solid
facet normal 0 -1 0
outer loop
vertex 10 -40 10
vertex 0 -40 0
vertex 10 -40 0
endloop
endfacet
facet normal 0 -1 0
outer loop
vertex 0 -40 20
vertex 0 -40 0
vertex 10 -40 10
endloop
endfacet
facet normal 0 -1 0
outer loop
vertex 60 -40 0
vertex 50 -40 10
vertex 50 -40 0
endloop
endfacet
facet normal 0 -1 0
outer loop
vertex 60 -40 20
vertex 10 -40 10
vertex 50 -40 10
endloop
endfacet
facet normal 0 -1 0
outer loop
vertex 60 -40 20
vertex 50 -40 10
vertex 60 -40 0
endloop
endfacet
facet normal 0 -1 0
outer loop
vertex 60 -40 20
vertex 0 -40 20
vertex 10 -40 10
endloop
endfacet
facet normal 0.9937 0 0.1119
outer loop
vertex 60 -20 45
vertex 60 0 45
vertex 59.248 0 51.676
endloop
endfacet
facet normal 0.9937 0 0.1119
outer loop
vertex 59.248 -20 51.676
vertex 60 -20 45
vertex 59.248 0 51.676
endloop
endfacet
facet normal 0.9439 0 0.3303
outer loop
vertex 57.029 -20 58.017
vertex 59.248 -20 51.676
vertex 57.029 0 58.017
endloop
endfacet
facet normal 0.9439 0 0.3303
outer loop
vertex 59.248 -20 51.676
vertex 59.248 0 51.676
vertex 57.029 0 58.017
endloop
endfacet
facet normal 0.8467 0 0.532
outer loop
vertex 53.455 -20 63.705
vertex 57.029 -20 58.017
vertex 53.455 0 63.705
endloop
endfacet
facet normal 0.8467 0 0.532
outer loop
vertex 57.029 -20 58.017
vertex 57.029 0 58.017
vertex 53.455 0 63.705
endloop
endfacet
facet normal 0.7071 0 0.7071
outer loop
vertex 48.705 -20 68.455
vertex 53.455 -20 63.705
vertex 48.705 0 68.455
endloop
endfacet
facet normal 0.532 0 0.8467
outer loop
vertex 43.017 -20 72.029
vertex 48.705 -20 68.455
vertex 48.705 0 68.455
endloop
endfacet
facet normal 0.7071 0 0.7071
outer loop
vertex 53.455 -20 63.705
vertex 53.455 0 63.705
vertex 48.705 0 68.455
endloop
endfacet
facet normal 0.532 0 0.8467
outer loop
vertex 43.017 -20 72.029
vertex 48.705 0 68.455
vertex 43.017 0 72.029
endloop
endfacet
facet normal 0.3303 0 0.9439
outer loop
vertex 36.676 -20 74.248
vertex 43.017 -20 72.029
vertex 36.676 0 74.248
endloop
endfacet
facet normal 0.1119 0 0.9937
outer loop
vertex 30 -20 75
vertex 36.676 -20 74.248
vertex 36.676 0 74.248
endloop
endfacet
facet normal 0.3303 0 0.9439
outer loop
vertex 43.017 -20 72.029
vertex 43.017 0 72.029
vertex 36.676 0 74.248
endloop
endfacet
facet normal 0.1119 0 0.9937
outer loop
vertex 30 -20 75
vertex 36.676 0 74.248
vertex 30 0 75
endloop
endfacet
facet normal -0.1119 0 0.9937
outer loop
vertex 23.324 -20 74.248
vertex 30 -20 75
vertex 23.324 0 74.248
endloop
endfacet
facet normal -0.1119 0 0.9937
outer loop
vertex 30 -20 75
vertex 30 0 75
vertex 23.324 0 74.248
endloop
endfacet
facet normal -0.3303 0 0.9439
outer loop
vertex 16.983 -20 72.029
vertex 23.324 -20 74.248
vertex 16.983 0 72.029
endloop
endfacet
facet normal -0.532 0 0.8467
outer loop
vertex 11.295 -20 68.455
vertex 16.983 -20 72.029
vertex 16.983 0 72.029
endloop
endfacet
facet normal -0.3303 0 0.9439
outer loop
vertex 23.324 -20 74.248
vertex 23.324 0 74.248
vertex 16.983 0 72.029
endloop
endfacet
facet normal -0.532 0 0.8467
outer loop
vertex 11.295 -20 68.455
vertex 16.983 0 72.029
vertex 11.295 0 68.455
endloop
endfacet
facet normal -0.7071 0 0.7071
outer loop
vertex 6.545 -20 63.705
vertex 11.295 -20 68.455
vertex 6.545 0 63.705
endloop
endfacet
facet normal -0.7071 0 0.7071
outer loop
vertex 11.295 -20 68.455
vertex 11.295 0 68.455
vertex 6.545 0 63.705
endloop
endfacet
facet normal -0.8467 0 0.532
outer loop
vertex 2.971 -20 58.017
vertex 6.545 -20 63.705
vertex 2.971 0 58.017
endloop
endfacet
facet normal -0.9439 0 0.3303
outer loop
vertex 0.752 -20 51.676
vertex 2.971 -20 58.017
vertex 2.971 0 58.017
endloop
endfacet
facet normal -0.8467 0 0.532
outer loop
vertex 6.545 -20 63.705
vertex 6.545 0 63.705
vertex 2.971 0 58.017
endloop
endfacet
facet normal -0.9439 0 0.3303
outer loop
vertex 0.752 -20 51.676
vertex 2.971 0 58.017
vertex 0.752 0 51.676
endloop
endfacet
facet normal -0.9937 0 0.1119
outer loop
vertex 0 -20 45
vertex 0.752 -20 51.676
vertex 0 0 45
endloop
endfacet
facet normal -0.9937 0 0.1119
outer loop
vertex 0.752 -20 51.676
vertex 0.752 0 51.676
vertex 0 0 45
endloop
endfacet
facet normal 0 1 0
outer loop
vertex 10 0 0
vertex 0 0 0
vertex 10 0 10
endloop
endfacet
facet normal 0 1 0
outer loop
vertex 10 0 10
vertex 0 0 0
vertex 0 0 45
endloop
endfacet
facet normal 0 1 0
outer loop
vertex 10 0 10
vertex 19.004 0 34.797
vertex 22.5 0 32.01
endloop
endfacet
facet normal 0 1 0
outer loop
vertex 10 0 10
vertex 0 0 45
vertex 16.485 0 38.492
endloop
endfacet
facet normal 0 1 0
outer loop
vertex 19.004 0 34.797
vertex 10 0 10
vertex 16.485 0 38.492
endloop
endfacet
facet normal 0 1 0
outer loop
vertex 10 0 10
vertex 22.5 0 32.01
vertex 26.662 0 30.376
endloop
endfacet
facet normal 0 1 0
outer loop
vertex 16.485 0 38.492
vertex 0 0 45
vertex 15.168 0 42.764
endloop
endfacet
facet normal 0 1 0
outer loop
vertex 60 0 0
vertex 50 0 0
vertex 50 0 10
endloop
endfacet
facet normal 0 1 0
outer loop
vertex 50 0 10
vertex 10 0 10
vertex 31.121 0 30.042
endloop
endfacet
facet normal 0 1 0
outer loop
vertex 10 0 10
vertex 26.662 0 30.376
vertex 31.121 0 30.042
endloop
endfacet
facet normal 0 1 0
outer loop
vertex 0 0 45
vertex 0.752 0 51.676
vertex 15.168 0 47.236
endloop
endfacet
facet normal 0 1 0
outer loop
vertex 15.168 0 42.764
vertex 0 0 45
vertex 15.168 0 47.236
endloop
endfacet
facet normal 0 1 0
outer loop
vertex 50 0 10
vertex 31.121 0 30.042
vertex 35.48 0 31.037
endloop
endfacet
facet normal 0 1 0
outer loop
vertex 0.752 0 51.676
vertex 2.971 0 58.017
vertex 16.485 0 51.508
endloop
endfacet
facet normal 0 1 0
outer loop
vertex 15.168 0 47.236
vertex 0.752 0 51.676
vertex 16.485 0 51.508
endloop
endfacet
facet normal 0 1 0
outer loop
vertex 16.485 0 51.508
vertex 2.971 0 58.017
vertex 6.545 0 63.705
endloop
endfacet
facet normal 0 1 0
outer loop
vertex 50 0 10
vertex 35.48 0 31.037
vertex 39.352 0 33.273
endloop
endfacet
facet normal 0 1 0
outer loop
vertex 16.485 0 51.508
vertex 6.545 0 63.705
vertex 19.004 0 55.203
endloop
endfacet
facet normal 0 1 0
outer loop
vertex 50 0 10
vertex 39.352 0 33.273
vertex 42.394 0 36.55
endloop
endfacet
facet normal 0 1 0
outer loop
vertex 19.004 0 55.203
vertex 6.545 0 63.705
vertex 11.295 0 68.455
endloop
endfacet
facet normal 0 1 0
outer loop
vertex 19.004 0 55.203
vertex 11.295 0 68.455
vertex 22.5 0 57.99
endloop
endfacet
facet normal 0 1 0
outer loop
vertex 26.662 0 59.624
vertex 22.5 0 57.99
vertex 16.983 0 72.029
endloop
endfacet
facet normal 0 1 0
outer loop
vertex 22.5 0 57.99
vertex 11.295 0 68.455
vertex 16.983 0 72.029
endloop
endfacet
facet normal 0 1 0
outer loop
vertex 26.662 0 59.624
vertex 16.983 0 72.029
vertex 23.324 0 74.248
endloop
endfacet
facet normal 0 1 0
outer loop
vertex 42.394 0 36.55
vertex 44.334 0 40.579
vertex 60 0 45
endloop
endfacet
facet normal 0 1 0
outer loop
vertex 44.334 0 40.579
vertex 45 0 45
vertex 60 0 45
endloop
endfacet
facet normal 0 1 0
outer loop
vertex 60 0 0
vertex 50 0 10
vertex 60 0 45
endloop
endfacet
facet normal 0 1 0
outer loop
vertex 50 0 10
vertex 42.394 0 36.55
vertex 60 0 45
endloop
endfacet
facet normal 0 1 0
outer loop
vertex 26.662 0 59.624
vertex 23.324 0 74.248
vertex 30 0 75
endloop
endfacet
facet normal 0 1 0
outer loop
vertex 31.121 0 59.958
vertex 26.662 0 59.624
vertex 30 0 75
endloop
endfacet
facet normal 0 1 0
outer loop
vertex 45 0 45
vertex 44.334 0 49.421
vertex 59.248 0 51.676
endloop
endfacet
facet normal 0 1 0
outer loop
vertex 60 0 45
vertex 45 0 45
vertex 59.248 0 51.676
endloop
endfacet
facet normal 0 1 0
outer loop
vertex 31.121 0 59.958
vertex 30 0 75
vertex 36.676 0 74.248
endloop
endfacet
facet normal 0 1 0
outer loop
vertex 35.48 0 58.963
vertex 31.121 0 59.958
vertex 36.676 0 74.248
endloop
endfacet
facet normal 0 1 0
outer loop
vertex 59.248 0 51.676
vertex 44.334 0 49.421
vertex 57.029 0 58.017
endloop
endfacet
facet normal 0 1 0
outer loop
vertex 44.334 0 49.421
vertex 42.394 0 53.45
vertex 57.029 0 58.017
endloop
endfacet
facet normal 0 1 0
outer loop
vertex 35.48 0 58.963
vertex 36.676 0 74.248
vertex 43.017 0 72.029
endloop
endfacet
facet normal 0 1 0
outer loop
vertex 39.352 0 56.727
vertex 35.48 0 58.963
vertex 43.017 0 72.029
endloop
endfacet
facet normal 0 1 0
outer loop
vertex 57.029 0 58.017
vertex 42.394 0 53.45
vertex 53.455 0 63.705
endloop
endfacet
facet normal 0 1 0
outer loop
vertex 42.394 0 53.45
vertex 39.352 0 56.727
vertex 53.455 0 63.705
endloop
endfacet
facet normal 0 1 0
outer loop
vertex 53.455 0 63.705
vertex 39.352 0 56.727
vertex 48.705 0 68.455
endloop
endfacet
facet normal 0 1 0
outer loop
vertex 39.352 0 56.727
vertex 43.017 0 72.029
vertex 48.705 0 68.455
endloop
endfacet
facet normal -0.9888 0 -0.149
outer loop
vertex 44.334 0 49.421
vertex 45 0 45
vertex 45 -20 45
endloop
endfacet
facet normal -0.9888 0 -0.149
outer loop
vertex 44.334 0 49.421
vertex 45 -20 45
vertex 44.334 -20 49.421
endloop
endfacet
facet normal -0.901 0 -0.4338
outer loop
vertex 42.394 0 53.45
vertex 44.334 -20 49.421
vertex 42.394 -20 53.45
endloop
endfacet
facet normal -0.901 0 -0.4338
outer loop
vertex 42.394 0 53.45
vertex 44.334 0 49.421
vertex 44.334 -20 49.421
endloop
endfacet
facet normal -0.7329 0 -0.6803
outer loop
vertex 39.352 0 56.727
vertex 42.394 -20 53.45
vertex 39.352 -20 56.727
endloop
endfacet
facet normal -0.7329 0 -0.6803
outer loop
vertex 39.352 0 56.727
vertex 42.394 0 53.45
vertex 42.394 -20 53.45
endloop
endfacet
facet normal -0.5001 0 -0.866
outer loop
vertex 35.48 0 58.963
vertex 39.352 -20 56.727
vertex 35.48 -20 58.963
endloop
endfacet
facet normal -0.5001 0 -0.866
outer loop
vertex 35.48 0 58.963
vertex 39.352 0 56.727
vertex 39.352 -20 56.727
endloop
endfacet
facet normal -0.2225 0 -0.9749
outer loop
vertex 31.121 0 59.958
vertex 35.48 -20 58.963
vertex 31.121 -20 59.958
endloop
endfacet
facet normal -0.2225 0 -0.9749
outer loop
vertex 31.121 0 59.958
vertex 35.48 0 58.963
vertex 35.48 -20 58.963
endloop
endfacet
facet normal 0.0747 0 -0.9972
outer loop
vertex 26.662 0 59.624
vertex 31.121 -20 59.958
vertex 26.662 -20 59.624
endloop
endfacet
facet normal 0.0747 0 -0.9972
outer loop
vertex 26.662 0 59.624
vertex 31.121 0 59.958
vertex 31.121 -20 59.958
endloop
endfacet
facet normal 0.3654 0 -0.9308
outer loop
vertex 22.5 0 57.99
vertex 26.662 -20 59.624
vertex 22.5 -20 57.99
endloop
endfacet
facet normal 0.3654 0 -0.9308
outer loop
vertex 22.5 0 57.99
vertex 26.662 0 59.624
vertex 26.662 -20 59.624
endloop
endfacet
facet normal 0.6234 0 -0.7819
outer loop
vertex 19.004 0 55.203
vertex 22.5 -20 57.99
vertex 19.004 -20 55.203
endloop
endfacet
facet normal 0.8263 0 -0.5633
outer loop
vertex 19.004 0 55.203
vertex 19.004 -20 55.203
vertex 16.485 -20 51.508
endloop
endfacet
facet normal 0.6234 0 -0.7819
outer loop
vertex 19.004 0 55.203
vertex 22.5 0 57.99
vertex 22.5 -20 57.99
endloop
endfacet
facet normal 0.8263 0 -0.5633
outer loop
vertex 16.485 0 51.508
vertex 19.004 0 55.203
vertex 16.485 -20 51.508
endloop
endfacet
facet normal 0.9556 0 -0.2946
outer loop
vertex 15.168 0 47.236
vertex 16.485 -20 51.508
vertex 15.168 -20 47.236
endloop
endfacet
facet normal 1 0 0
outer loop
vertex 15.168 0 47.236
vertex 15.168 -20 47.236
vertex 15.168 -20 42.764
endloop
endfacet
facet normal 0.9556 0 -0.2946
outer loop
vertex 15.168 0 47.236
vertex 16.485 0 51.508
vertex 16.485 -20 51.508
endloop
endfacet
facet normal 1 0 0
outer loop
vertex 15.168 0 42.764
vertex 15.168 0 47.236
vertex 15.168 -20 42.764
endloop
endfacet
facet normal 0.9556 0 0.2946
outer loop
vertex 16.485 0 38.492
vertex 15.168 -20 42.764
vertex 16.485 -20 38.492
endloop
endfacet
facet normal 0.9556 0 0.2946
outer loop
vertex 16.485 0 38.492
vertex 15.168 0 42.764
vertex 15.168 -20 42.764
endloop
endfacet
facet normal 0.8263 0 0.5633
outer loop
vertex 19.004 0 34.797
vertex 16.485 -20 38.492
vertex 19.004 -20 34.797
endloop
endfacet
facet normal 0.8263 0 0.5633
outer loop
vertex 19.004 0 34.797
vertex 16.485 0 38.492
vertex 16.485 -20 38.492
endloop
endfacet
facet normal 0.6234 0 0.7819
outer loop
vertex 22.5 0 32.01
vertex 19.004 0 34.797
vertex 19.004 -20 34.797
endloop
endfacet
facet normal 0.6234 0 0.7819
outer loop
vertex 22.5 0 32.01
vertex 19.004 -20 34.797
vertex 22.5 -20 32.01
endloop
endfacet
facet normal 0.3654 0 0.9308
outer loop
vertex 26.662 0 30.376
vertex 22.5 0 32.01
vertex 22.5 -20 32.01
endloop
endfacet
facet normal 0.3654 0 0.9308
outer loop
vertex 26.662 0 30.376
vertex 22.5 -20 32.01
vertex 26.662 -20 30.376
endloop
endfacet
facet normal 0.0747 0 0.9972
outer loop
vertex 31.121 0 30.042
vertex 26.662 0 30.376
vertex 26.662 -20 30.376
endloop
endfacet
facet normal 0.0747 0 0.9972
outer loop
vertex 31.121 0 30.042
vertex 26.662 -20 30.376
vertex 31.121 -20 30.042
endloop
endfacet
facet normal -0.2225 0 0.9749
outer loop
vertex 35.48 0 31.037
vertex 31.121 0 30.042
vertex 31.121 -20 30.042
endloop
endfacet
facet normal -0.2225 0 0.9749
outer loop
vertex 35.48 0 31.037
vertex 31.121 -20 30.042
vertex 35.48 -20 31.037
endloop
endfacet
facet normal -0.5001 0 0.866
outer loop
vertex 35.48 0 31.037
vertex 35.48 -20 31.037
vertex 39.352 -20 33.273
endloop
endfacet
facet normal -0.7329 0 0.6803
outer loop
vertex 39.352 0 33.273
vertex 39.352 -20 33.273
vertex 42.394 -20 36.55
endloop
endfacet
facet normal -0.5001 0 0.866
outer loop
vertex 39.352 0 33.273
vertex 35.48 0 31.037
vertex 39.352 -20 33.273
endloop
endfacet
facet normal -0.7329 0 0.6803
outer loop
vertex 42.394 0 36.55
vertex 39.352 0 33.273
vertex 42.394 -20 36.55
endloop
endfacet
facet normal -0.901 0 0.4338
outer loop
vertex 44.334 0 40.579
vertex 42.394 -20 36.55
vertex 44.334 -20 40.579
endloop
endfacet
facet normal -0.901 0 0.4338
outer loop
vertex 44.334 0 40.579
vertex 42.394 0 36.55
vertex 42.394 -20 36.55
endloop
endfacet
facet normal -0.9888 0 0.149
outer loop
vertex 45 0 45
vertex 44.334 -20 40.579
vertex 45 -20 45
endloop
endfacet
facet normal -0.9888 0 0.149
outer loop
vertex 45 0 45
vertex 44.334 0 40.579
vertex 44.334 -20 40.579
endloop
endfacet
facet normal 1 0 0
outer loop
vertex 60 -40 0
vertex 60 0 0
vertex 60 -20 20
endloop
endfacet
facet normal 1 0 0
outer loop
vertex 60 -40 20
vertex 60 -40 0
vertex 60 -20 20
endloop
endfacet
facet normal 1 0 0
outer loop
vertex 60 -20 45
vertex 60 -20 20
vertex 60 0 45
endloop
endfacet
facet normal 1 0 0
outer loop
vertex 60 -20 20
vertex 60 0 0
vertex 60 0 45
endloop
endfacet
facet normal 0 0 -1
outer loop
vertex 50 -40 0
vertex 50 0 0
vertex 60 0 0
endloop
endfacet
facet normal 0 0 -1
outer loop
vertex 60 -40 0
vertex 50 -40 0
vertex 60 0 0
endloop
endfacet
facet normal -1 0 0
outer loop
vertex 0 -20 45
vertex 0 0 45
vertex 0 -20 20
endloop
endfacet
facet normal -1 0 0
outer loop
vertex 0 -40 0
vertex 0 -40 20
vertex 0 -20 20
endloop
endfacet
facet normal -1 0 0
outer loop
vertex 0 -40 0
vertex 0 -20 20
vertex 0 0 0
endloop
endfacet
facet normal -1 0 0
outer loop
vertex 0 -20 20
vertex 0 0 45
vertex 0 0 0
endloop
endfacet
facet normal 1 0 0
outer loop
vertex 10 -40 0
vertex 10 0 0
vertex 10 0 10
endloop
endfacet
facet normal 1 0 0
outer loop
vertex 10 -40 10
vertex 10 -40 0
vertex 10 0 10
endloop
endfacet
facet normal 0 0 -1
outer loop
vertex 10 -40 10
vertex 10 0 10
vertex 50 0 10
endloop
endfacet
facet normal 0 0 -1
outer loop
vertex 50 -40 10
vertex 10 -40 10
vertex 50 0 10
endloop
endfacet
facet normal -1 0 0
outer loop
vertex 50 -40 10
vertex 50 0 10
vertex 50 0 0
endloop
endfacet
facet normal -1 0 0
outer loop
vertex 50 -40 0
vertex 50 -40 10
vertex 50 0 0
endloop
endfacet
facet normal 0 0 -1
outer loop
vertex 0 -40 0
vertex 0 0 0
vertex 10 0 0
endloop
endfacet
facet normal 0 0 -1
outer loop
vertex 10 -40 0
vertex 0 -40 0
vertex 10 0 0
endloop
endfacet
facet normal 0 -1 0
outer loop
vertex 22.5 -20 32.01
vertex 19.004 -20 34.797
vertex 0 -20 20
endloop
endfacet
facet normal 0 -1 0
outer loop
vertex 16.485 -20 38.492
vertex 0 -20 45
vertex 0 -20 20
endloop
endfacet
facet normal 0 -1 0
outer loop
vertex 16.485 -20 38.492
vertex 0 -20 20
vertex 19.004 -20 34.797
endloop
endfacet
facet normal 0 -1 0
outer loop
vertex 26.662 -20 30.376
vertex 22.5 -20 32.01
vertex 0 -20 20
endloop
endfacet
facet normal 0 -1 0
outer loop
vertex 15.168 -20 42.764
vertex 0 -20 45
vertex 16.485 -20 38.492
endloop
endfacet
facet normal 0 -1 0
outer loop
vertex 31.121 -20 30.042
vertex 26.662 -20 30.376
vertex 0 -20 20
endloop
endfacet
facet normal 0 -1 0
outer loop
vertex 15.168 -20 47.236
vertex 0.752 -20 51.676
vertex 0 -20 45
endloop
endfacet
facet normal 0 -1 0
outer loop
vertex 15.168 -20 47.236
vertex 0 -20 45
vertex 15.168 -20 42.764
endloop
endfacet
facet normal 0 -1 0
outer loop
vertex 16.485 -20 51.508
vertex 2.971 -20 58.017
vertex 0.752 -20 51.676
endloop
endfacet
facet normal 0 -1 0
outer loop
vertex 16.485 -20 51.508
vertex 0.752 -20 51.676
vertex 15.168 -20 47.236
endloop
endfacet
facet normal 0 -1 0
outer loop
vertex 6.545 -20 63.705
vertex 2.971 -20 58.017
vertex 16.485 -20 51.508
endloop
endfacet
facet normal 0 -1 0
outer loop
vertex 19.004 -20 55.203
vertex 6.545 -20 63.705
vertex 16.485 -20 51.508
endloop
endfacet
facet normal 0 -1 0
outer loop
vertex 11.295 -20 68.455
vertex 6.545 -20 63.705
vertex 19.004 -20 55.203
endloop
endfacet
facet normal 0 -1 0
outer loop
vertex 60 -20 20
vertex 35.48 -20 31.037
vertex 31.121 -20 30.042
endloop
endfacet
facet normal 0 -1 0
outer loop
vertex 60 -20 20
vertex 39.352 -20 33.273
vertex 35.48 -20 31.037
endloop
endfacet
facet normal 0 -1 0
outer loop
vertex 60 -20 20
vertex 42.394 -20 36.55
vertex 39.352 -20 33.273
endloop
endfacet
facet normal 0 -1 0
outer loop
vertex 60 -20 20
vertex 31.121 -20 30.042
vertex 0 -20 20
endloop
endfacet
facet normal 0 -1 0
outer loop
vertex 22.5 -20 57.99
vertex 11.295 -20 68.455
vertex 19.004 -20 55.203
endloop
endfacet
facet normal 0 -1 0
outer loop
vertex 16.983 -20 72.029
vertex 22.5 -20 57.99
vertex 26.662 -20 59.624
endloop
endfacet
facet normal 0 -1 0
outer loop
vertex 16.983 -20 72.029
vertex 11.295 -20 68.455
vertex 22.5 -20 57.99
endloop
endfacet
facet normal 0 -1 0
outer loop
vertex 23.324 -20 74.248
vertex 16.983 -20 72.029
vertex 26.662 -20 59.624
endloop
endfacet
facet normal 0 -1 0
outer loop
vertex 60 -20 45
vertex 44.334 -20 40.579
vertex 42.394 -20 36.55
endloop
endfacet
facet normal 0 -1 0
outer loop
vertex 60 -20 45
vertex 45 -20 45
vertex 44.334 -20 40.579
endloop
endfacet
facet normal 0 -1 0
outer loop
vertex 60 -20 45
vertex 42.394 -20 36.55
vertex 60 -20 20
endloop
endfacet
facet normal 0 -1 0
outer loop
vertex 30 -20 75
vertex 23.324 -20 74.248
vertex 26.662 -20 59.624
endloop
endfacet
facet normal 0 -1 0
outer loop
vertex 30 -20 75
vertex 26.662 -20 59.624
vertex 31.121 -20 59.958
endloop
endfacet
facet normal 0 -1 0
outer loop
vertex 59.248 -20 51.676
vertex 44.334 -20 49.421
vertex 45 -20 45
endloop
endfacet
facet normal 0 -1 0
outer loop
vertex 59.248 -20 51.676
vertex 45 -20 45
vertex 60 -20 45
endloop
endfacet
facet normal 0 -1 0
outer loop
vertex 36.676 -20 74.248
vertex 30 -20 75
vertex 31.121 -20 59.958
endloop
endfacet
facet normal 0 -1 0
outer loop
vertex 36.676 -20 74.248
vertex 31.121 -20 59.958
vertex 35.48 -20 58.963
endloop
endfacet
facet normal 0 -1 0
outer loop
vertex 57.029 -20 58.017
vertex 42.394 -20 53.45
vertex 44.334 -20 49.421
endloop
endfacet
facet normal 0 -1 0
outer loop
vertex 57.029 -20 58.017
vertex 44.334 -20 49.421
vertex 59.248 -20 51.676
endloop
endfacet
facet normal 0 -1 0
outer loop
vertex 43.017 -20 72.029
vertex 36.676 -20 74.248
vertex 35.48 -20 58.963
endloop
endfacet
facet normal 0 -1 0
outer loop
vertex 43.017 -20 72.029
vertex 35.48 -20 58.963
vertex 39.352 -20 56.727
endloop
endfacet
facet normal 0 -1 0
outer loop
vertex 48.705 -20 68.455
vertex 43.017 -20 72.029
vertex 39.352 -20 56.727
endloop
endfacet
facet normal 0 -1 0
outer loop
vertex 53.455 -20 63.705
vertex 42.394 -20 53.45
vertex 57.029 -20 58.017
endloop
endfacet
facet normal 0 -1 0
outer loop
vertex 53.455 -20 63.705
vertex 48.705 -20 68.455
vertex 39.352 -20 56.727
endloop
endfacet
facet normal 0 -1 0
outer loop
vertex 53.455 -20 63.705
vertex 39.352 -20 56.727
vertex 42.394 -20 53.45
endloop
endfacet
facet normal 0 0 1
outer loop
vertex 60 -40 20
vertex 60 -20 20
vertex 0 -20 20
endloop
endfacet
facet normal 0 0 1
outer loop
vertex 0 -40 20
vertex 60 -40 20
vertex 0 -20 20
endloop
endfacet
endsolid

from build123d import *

# Parameters (mm, degrees)
F1_DEPTH = 40
F0_R     = 15
F2_DEPTH = 20


with BuildPart() as f1:
    # F0 (on Front) → F1 (new body)
    with BuildSketch(Plane.XZ):
        Polygon((0, 20), (0, 0), (10, 0), (10, 10), (50, 10), (50, 0), (60, 0), (60, 20), align=None)
    extrude(amount=F1_DEPTH)

    # F0 (on Front) → F2 (join)
    with BuildSketch(Plane.XZ):
        with BuildLine():
            Line((0, 45), (0, 20))
            Line((0, 20), (60, 20))
            Line((60, 20), (60, 45))
            ThreePointArc((60, 45), (30, 75), (0, 45))
        make_face()
        with Locations((30, 45)):
            Circle(F0_R, mode=Mode.SUBTRACT)
    extrude(amount=F2_DEPTH)


solid = f1.part
